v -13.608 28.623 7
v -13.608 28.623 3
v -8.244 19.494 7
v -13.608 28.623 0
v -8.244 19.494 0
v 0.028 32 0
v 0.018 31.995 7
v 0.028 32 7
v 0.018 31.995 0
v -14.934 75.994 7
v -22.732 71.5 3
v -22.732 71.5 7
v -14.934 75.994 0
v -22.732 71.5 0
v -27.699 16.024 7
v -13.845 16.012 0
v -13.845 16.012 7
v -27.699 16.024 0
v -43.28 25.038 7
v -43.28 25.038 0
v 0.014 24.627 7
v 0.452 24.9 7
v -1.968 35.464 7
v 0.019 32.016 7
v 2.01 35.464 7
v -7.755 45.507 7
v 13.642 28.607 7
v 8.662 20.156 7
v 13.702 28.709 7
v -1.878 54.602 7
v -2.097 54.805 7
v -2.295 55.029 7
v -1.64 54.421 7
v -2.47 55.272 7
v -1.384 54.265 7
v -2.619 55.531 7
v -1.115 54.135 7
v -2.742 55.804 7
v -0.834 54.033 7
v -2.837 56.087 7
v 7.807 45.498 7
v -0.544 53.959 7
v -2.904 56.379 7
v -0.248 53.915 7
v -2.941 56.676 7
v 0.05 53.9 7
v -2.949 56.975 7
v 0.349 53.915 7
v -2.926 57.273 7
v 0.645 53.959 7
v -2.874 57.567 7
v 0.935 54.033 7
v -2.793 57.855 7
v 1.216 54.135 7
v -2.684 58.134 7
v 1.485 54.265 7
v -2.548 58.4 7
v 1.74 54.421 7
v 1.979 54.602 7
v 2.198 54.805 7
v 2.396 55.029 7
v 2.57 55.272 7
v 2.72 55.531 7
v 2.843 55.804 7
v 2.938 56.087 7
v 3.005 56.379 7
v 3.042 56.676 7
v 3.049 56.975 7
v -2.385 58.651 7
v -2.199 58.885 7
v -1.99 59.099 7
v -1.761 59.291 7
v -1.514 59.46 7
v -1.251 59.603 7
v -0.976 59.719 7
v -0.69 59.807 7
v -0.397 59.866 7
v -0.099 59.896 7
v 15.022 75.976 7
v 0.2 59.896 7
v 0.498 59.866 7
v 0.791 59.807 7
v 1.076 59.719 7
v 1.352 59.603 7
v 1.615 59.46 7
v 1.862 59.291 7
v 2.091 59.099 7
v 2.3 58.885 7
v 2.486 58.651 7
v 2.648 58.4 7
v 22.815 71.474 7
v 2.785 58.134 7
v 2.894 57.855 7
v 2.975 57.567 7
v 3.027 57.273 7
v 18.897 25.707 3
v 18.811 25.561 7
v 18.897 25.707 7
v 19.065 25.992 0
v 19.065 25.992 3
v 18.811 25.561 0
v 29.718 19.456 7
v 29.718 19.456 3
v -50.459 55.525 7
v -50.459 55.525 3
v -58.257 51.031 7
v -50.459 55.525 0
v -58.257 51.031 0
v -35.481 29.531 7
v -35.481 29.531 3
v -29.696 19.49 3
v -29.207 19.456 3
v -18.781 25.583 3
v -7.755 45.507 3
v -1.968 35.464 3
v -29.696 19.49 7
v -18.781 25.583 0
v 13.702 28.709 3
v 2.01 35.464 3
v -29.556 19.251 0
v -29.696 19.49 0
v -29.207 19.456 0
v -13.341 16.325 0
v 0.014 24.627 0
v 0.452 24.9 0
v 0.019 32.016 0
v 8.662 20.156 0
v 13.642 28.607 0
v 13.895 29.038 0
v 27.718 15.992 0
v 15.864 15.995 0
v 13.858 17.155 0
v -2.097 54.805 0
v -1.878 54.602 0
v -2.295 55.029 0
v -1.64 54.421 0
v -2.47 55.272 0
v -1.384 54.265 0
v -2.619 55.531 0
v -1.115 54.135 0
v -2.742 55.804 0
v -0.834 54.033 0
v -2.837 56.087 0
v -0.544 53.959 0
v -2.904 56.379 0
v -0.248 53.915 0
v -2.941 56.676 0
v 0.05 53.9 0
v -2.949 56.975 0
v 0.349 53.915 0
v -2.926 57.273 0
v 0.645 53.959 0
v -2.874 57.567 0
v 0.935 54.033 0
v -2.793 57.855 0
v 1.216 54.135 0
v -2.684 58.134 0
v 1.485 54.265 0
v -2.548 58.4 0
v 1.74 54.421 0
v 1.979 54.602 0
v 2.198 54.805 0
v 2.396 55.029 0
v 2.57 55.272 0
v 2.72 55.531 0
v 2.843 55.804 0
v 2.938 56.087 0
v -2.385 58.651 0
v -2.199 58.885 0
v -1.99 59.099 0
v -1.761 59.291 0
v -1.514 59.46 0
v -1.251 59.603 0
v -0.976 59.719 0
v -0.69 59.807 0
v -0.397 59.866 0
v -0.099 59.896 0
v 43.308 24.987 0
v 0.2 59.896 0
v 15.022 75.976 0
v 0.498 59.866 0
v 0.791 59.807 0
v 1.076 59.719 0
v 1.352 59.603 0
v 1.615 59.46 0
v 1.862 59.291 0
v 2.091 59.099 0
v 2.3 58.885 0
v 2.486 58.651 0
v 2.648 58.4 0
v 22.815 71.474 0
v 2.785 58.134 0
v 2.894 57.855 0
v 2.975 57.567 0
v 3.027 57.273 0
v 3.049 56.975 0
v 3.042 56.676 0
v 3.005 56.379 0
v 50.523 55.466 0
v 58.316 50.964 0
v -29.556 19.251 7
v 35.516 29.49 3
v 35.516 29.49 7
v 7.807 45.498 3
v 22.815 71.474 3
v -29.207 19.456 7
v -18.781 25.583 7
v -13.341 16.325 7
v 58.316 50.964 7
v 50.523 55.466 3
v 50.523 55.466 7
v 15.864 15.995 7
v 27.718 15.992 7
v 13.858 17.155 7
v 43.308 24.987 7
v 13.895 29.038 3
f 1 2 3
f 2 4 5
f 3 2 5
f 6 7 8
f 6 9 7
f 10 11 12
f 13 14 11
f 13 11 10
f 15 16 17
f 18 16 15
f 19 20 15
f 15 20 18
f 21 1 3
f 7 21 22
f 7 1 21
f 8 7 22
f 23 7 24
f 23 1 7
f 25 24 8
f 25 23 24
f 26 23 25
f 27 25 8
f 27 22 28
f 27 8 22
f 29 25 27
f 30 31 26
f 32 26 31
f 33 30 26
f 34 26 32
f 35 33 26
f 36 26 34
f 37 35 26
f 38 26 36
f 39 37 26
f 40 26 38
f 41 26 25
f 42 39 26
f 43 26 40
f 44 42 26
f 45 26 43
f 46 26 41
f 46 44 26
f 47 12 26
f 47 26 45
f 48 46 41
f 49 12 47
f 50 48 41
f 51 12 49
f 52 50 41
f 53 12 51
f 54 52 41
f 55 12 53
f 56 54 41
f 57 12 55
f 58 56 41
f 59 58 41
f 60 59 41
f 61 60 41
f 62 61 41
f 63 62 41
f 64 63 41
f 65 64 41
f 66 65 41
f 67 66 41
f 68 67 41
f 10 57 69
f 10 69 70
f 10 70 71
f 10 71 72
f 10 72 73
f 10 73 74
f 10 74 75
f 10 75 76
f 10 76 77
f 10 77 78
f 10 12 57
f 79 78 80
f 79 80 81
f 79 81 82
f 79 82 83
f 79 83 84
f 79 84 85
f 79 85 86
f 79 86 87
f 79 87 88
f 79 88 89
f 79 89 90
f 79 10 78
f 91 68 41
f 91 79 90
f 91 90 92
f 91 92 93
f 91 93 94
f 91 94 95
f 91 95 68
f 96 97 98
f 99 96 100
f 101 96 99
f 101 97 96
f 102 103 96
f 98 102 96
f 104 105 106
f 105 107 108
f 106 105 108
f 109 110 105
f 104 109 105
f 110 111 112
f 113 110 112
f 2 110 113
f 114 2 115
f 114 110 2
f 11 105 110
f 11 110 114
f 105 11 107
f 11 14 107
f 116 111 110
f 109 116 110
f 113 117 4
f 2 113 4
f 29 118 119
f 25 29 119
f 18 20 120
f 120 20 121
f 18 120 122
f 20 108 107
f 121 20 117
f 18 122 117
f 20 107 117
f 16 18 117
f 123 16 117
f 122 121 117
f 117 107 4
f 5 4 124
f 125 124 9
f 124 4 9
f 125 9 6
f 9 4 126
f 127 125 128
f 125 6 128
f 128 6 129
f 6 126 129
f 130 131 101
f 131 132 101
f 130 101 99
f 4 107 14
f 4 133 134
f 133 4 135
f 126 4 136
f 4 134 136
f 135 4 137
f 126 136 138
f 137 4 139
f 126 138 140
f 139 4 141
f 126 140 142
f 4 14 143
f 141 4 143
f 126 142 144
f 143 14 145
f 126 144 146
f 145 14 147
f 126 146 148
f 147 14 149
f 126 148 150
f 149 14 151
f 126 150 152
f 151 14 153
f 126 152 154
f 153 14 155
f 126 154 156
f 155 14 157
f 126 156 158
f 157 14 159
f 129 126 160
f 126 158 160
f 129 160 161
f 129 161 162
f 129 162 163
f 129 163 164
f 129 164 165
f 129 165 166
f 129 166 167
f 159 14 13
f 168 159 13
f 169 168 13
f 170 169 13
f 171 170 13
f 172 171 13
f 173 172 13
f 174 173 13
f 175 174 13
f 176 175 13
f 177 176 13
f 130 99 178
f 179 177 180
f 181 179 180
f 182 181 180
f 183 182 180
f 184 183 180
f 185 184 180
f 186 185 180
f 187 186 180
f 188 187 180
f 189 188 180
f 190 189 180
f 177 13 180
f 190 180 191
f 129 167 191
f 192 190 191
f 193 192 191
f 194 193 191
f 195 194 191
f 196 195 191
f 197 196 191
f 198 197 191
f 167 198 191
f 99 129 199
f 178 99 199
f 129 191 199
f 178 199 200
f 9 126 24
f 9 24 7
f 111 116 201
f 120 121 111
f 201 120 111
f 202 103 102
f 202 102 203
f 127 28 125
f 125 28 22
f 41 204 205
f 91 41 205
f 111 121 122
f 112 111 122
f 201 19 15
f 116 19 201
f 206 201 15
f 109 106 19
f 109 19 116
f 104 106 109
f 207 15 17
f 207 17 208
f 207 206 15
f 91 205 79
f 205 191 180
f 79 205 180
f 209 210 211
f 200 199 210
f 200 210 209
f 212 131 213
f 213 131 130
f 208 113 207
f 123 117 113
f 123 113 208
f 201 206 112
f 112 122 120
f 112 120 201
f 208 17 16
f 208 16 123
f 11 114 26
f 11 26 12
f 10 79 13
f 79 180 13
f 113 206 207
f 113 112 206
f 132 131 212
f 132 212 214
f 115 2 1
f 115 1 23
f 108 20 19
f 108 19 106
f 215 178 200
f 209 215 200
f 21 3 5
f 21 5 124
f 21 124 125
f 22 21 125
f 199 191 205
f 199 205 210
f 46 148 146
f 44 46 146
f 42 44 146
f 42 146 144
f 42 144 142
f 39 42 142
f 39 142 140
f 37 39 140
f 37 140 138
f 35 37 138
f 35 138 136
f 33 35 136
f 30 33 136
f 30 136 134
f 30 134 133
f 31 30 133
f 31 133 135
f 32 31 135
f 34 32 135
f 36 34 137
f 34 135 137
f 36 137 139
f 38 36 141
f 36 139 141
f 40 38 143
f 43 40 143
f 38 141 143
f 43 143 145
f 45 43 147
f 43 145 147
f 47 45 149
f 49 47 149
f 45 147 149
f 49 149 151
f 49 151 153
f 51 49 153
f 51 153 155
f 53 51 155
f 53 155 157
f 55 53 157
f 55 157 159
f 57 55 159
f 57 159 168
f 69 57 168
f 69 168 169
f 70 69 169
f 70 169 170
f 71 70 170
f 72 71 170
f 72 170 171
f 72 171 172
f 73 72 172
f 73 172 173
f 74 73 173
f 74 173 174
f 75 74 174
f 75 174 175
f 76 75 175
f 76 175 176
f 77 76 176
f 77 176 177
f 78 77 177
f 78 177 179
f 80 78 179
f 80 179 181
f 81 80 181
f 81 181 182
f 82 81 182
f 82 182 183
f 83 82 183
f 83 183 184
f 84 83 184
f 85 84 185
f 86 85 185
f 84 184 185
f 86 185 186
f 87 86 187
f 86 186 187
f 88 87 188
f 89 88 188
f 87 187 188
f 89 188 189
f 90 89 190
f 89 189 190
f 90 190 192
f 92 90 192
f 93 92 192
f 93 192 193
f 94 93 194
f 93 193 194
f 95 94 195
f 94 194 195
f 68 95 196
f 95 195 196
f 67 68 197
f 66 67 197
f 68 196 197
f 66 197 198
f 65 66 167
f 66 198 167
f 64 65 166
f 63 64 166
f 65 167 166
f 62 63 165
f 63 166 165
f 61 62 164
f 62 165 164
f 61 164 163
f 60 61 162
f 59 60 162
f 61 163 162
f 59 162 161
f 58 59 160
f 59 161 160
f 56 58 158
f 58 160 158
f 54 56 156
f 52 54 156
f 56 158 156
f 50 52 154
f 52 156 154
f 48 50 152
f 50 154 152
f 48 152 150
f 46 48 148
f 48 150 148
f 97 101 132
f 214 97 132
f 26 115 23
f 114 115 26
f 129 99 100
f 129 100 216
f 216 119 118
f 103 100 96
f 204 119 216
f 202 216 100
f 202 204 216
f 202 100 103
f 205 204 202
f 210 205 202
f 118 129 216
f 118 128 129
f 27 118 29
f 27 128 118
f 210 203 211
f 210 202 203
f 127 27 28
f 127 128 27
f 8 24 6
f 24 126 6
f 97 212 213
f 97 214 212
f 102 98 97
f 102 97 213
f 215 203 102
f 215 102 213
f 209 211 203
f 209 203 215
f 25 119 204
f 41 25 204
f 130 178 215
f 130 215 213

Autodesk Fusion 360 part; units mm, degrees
sketch "Skizze1" plane through (0, 0, 0) normal (0, 0, 1) x (1, 0, 0)
  line L0 (0.0185, 31.9947) -> (0.0278, 32)
  line L1 (-1.9679, 35.4635) -> (-7.7548, 45.5067)
  line L2 (-29.6959, 19.4899) -> (-35.4814, 29.5308)
  line L3 (-43.2796, 25.0376) -> (-27.6989, 16.024)
  line L4 (-0.7462, 33.3433) -> (0.0278, 32)
  line L5 (0.0278, 32) -> (0.8041, 33.3419)
  line L6 (0.0093, 16) -> (-27.6989, 16.024)
  line L7 (-7.7548, 45.5067) -> (-22.7322, 71.5005)
  line L8 (-35.4814, 29.5308) -> (-50.4589, 55.5246)
  line L9 (-22.7322, 71.5005) -> (-50.4589, 55.5246)
  line L10 (-22.7322, 71.5005) -> (-14.9341, 75.9937)
  line L11 (-43.2796, 25.0376) -> (-58.257, 51.0313)
  line L12 (-50.4589, 55.5246) -> (-58.257, 51.0313)
  line L13 (0.0434, 74.9415) -> (0, 0)
  line L14 (35.5156, 29.4897) -> (50.5231, 55.4661)
  line L15 (22.815, 71.4741) -> (15.022, 75.9764)
  line L16 (0.0093, 16) -> (27.7175, 15.992)
  line L17 (7.8074, 45.4977) -> (22.815, 71.4741)
  line L18 (29.7185, 19.4555) -> (35.5156, 29.4897)
  line L19 (43.3085, 24.9874) -> (27.7175, 15.992)
  line L20 (50.5231, 55.4661) -> (58.3161, 50.9638)
  line L21 (22.815, 71.4741) -> (50.5231, 55.4661)
  line L22 (43.3085, 24.9874) -> (58.3161, 50.9638)
  line L23 (2.0103, 35.4635) -> (7.8074, 45.4977)
  line L24 (15.022, 75.9764) -> (-14.9341, 75.9937)
  line L25 (29.7185, 19.4555) -> (2.0103, 35.4635)
  line L26 (-29.6959, 19.4899) -> (-29.2073, 19.4555)
  line L27 (-29.2073, 19.4555) -> (-1.9679, 35.4635)
  line L28 (0.0185, 31.9947) -> (0.0093, 32)
  line L29 (0.0434, 50) -> (0.029, 50.025)
  line L30 (0.0145, 50) -> (0.029, 50.025)
  line L31 (-29.2073, 19.4555) -> (-29.5555, 19.2509)
  line L32 (-29.6959, 19.4899) -> (-29.5555, 19.2509)
  dimension "d1" = 50
  dimension "d2" = 32
  dimension "d8" = 30
  dimension "d10" = 30
extrude "Extrusion3" add sketch "Skizze1" along normal blind 4 contours L1 L2 L3 L6 L7 L8 L10 L11 L12 L14 L15 L16 L17 L18 L19 L20 L22 L23 L24 L25 L27 L31 L32
extrude "Extrusion4" add sketch "Skizze1" along normal blind 3 contours L1 L2 L7 L8 L9 L26 L27 | L14 L17 L18 L21 L23 L25
extrude "Extrusion5" add 1 faces at (0.6994, 62.4779, 4) along direction (0, 0, 1) blind 3
hole "Bohrung1" at (0.0504, 56.8999, 7) direction (0, 0, -1) diameter 6 depth 8 tip angle 118
sketch "Skizze2" plane through (0, 0, 7) normal (0, 0, 1) x (-1, 0, 0)
  circle A0 centre (-0.0504, -56.8999) radius 3
  line L0 (-0.0278, -32) -> (-0.0185, -31.9947)
  line L1 (-0.0185, -31.9947) -> (-0.0185, -32.016)
  line L2 (-0.0185, -32.016) -> (-0.0278, -32)
  line L3 (29.6959, -19.4899) -> (50.4589, -55.5246)
  line L4 (50.4589, -55.5246) -> (58.257, -51.0313)
  line L5 (58.257, -51.0313) -> (43.2796, -25.0376)
  line L6 (43.2796, -25.0376) -> (27.6989, -16.024)
  line L7 (27.6989, -16.024) -> (-0.0093, -16)
  line L8 (-0.0093, -16) -> (-27.7175, -15.992)
  line L9 (-27.7175, -15.992) -> (-43.3085, -24.9874)
  line L10 (-43.3085, -24.9874) -> (-58.3161, -50.9638)
  line L11 (-58.3161, -50.9638) -> (-50.5231, -55.4661)
  line L12 (-50.5231, -55.4661) -> (-29.7185, -19.4555)
  line L13 (-29.7185, -19.4555) -> (-2.0103, -35.4635)
  line L14 (-2.0103, -35.4635) -> (-22.815, -71.4741)
  line L15 (-22.815, -71.4741) -> (-15.022, -75.9764)
  line L16 (-15.022, -75.9764) -> (14.9341, -75.9937)
  line L17 (14.9341, -75.9937) -> (22.7322, -71.5005)
  line L18 (22.7322, -71.5005) -> (1.9679, -35.4635)
  line L19 (1.9679, -35.4635) -> (29.5555, -19.2509)
  line L20 (29.5555, -19.2509) -> (29.6959, -19.4899)
  line L21 (-15.8644, -15.9954) -> (-0.4521, -24.8996)
  line L22 (13.8448, -16.012) -> (-0.4521, -24.8996)
extrude "Extrusion6" cut sketch "Skizze2" against normal blind 23 contours L7 L8 L21 L22
sketch "Skizze3" plane through (0, 0, 3) normal (0, 0, 1) x (-1, 0, 0)
  line L0 (29.6959, -19.4899) -> (29.2073, -19.4555)
  line L1 (29.2073, -19.4555) -> (1.9679, -35.4635)
  line L2 (1.9679, -35.4635) -> (22.7322, -71.5005)
  line L3 (22.7322, -71.5005) -> (50.4589, -55.5246)
  line L4 (50.4589, -55.5246) -> (29.6959, -19.4899)
  line L5 (18.7813, -25.5826) -> (13.6085, -28.6226)
  line L6 (18.7813, -25.5826) -> (13.1225, -15.9535)
  line L7 (13.6085, -28.6226) -> (7.9138, -18.9326)
  line L8 (7.9138, -18.9326) -> (13.1225, -15.9535)
  line L9 (-0.0434, -74.9415) -> (0, 0)
  line L10 (-13.6416, -28.6068) -> (-7.9358, -18.9234)
  line L11 (-7.9358, -18.9234) -> (-13.1409, -15.9383)
  line L12 (-18.8109, -25.5609) -> (-13.1409, -15.9383)
  line L13 (-18.8109, -25.5609) -> (-13.6416, -28.6068)
  dimension "d23" = 6
  dimension "d24" = 12.5
extrude "Extrusion7" cut sketch "Skizze3" along normal mid plane 26 contours L1 L5 L6 L7 L8 | L10 L11 L12 L13
extrude "Extrusion8" cut 1 faces at (17.0878, 26.5762, 2.3333) along direction (0.507661, 0.861557, 0) blind 0.5
